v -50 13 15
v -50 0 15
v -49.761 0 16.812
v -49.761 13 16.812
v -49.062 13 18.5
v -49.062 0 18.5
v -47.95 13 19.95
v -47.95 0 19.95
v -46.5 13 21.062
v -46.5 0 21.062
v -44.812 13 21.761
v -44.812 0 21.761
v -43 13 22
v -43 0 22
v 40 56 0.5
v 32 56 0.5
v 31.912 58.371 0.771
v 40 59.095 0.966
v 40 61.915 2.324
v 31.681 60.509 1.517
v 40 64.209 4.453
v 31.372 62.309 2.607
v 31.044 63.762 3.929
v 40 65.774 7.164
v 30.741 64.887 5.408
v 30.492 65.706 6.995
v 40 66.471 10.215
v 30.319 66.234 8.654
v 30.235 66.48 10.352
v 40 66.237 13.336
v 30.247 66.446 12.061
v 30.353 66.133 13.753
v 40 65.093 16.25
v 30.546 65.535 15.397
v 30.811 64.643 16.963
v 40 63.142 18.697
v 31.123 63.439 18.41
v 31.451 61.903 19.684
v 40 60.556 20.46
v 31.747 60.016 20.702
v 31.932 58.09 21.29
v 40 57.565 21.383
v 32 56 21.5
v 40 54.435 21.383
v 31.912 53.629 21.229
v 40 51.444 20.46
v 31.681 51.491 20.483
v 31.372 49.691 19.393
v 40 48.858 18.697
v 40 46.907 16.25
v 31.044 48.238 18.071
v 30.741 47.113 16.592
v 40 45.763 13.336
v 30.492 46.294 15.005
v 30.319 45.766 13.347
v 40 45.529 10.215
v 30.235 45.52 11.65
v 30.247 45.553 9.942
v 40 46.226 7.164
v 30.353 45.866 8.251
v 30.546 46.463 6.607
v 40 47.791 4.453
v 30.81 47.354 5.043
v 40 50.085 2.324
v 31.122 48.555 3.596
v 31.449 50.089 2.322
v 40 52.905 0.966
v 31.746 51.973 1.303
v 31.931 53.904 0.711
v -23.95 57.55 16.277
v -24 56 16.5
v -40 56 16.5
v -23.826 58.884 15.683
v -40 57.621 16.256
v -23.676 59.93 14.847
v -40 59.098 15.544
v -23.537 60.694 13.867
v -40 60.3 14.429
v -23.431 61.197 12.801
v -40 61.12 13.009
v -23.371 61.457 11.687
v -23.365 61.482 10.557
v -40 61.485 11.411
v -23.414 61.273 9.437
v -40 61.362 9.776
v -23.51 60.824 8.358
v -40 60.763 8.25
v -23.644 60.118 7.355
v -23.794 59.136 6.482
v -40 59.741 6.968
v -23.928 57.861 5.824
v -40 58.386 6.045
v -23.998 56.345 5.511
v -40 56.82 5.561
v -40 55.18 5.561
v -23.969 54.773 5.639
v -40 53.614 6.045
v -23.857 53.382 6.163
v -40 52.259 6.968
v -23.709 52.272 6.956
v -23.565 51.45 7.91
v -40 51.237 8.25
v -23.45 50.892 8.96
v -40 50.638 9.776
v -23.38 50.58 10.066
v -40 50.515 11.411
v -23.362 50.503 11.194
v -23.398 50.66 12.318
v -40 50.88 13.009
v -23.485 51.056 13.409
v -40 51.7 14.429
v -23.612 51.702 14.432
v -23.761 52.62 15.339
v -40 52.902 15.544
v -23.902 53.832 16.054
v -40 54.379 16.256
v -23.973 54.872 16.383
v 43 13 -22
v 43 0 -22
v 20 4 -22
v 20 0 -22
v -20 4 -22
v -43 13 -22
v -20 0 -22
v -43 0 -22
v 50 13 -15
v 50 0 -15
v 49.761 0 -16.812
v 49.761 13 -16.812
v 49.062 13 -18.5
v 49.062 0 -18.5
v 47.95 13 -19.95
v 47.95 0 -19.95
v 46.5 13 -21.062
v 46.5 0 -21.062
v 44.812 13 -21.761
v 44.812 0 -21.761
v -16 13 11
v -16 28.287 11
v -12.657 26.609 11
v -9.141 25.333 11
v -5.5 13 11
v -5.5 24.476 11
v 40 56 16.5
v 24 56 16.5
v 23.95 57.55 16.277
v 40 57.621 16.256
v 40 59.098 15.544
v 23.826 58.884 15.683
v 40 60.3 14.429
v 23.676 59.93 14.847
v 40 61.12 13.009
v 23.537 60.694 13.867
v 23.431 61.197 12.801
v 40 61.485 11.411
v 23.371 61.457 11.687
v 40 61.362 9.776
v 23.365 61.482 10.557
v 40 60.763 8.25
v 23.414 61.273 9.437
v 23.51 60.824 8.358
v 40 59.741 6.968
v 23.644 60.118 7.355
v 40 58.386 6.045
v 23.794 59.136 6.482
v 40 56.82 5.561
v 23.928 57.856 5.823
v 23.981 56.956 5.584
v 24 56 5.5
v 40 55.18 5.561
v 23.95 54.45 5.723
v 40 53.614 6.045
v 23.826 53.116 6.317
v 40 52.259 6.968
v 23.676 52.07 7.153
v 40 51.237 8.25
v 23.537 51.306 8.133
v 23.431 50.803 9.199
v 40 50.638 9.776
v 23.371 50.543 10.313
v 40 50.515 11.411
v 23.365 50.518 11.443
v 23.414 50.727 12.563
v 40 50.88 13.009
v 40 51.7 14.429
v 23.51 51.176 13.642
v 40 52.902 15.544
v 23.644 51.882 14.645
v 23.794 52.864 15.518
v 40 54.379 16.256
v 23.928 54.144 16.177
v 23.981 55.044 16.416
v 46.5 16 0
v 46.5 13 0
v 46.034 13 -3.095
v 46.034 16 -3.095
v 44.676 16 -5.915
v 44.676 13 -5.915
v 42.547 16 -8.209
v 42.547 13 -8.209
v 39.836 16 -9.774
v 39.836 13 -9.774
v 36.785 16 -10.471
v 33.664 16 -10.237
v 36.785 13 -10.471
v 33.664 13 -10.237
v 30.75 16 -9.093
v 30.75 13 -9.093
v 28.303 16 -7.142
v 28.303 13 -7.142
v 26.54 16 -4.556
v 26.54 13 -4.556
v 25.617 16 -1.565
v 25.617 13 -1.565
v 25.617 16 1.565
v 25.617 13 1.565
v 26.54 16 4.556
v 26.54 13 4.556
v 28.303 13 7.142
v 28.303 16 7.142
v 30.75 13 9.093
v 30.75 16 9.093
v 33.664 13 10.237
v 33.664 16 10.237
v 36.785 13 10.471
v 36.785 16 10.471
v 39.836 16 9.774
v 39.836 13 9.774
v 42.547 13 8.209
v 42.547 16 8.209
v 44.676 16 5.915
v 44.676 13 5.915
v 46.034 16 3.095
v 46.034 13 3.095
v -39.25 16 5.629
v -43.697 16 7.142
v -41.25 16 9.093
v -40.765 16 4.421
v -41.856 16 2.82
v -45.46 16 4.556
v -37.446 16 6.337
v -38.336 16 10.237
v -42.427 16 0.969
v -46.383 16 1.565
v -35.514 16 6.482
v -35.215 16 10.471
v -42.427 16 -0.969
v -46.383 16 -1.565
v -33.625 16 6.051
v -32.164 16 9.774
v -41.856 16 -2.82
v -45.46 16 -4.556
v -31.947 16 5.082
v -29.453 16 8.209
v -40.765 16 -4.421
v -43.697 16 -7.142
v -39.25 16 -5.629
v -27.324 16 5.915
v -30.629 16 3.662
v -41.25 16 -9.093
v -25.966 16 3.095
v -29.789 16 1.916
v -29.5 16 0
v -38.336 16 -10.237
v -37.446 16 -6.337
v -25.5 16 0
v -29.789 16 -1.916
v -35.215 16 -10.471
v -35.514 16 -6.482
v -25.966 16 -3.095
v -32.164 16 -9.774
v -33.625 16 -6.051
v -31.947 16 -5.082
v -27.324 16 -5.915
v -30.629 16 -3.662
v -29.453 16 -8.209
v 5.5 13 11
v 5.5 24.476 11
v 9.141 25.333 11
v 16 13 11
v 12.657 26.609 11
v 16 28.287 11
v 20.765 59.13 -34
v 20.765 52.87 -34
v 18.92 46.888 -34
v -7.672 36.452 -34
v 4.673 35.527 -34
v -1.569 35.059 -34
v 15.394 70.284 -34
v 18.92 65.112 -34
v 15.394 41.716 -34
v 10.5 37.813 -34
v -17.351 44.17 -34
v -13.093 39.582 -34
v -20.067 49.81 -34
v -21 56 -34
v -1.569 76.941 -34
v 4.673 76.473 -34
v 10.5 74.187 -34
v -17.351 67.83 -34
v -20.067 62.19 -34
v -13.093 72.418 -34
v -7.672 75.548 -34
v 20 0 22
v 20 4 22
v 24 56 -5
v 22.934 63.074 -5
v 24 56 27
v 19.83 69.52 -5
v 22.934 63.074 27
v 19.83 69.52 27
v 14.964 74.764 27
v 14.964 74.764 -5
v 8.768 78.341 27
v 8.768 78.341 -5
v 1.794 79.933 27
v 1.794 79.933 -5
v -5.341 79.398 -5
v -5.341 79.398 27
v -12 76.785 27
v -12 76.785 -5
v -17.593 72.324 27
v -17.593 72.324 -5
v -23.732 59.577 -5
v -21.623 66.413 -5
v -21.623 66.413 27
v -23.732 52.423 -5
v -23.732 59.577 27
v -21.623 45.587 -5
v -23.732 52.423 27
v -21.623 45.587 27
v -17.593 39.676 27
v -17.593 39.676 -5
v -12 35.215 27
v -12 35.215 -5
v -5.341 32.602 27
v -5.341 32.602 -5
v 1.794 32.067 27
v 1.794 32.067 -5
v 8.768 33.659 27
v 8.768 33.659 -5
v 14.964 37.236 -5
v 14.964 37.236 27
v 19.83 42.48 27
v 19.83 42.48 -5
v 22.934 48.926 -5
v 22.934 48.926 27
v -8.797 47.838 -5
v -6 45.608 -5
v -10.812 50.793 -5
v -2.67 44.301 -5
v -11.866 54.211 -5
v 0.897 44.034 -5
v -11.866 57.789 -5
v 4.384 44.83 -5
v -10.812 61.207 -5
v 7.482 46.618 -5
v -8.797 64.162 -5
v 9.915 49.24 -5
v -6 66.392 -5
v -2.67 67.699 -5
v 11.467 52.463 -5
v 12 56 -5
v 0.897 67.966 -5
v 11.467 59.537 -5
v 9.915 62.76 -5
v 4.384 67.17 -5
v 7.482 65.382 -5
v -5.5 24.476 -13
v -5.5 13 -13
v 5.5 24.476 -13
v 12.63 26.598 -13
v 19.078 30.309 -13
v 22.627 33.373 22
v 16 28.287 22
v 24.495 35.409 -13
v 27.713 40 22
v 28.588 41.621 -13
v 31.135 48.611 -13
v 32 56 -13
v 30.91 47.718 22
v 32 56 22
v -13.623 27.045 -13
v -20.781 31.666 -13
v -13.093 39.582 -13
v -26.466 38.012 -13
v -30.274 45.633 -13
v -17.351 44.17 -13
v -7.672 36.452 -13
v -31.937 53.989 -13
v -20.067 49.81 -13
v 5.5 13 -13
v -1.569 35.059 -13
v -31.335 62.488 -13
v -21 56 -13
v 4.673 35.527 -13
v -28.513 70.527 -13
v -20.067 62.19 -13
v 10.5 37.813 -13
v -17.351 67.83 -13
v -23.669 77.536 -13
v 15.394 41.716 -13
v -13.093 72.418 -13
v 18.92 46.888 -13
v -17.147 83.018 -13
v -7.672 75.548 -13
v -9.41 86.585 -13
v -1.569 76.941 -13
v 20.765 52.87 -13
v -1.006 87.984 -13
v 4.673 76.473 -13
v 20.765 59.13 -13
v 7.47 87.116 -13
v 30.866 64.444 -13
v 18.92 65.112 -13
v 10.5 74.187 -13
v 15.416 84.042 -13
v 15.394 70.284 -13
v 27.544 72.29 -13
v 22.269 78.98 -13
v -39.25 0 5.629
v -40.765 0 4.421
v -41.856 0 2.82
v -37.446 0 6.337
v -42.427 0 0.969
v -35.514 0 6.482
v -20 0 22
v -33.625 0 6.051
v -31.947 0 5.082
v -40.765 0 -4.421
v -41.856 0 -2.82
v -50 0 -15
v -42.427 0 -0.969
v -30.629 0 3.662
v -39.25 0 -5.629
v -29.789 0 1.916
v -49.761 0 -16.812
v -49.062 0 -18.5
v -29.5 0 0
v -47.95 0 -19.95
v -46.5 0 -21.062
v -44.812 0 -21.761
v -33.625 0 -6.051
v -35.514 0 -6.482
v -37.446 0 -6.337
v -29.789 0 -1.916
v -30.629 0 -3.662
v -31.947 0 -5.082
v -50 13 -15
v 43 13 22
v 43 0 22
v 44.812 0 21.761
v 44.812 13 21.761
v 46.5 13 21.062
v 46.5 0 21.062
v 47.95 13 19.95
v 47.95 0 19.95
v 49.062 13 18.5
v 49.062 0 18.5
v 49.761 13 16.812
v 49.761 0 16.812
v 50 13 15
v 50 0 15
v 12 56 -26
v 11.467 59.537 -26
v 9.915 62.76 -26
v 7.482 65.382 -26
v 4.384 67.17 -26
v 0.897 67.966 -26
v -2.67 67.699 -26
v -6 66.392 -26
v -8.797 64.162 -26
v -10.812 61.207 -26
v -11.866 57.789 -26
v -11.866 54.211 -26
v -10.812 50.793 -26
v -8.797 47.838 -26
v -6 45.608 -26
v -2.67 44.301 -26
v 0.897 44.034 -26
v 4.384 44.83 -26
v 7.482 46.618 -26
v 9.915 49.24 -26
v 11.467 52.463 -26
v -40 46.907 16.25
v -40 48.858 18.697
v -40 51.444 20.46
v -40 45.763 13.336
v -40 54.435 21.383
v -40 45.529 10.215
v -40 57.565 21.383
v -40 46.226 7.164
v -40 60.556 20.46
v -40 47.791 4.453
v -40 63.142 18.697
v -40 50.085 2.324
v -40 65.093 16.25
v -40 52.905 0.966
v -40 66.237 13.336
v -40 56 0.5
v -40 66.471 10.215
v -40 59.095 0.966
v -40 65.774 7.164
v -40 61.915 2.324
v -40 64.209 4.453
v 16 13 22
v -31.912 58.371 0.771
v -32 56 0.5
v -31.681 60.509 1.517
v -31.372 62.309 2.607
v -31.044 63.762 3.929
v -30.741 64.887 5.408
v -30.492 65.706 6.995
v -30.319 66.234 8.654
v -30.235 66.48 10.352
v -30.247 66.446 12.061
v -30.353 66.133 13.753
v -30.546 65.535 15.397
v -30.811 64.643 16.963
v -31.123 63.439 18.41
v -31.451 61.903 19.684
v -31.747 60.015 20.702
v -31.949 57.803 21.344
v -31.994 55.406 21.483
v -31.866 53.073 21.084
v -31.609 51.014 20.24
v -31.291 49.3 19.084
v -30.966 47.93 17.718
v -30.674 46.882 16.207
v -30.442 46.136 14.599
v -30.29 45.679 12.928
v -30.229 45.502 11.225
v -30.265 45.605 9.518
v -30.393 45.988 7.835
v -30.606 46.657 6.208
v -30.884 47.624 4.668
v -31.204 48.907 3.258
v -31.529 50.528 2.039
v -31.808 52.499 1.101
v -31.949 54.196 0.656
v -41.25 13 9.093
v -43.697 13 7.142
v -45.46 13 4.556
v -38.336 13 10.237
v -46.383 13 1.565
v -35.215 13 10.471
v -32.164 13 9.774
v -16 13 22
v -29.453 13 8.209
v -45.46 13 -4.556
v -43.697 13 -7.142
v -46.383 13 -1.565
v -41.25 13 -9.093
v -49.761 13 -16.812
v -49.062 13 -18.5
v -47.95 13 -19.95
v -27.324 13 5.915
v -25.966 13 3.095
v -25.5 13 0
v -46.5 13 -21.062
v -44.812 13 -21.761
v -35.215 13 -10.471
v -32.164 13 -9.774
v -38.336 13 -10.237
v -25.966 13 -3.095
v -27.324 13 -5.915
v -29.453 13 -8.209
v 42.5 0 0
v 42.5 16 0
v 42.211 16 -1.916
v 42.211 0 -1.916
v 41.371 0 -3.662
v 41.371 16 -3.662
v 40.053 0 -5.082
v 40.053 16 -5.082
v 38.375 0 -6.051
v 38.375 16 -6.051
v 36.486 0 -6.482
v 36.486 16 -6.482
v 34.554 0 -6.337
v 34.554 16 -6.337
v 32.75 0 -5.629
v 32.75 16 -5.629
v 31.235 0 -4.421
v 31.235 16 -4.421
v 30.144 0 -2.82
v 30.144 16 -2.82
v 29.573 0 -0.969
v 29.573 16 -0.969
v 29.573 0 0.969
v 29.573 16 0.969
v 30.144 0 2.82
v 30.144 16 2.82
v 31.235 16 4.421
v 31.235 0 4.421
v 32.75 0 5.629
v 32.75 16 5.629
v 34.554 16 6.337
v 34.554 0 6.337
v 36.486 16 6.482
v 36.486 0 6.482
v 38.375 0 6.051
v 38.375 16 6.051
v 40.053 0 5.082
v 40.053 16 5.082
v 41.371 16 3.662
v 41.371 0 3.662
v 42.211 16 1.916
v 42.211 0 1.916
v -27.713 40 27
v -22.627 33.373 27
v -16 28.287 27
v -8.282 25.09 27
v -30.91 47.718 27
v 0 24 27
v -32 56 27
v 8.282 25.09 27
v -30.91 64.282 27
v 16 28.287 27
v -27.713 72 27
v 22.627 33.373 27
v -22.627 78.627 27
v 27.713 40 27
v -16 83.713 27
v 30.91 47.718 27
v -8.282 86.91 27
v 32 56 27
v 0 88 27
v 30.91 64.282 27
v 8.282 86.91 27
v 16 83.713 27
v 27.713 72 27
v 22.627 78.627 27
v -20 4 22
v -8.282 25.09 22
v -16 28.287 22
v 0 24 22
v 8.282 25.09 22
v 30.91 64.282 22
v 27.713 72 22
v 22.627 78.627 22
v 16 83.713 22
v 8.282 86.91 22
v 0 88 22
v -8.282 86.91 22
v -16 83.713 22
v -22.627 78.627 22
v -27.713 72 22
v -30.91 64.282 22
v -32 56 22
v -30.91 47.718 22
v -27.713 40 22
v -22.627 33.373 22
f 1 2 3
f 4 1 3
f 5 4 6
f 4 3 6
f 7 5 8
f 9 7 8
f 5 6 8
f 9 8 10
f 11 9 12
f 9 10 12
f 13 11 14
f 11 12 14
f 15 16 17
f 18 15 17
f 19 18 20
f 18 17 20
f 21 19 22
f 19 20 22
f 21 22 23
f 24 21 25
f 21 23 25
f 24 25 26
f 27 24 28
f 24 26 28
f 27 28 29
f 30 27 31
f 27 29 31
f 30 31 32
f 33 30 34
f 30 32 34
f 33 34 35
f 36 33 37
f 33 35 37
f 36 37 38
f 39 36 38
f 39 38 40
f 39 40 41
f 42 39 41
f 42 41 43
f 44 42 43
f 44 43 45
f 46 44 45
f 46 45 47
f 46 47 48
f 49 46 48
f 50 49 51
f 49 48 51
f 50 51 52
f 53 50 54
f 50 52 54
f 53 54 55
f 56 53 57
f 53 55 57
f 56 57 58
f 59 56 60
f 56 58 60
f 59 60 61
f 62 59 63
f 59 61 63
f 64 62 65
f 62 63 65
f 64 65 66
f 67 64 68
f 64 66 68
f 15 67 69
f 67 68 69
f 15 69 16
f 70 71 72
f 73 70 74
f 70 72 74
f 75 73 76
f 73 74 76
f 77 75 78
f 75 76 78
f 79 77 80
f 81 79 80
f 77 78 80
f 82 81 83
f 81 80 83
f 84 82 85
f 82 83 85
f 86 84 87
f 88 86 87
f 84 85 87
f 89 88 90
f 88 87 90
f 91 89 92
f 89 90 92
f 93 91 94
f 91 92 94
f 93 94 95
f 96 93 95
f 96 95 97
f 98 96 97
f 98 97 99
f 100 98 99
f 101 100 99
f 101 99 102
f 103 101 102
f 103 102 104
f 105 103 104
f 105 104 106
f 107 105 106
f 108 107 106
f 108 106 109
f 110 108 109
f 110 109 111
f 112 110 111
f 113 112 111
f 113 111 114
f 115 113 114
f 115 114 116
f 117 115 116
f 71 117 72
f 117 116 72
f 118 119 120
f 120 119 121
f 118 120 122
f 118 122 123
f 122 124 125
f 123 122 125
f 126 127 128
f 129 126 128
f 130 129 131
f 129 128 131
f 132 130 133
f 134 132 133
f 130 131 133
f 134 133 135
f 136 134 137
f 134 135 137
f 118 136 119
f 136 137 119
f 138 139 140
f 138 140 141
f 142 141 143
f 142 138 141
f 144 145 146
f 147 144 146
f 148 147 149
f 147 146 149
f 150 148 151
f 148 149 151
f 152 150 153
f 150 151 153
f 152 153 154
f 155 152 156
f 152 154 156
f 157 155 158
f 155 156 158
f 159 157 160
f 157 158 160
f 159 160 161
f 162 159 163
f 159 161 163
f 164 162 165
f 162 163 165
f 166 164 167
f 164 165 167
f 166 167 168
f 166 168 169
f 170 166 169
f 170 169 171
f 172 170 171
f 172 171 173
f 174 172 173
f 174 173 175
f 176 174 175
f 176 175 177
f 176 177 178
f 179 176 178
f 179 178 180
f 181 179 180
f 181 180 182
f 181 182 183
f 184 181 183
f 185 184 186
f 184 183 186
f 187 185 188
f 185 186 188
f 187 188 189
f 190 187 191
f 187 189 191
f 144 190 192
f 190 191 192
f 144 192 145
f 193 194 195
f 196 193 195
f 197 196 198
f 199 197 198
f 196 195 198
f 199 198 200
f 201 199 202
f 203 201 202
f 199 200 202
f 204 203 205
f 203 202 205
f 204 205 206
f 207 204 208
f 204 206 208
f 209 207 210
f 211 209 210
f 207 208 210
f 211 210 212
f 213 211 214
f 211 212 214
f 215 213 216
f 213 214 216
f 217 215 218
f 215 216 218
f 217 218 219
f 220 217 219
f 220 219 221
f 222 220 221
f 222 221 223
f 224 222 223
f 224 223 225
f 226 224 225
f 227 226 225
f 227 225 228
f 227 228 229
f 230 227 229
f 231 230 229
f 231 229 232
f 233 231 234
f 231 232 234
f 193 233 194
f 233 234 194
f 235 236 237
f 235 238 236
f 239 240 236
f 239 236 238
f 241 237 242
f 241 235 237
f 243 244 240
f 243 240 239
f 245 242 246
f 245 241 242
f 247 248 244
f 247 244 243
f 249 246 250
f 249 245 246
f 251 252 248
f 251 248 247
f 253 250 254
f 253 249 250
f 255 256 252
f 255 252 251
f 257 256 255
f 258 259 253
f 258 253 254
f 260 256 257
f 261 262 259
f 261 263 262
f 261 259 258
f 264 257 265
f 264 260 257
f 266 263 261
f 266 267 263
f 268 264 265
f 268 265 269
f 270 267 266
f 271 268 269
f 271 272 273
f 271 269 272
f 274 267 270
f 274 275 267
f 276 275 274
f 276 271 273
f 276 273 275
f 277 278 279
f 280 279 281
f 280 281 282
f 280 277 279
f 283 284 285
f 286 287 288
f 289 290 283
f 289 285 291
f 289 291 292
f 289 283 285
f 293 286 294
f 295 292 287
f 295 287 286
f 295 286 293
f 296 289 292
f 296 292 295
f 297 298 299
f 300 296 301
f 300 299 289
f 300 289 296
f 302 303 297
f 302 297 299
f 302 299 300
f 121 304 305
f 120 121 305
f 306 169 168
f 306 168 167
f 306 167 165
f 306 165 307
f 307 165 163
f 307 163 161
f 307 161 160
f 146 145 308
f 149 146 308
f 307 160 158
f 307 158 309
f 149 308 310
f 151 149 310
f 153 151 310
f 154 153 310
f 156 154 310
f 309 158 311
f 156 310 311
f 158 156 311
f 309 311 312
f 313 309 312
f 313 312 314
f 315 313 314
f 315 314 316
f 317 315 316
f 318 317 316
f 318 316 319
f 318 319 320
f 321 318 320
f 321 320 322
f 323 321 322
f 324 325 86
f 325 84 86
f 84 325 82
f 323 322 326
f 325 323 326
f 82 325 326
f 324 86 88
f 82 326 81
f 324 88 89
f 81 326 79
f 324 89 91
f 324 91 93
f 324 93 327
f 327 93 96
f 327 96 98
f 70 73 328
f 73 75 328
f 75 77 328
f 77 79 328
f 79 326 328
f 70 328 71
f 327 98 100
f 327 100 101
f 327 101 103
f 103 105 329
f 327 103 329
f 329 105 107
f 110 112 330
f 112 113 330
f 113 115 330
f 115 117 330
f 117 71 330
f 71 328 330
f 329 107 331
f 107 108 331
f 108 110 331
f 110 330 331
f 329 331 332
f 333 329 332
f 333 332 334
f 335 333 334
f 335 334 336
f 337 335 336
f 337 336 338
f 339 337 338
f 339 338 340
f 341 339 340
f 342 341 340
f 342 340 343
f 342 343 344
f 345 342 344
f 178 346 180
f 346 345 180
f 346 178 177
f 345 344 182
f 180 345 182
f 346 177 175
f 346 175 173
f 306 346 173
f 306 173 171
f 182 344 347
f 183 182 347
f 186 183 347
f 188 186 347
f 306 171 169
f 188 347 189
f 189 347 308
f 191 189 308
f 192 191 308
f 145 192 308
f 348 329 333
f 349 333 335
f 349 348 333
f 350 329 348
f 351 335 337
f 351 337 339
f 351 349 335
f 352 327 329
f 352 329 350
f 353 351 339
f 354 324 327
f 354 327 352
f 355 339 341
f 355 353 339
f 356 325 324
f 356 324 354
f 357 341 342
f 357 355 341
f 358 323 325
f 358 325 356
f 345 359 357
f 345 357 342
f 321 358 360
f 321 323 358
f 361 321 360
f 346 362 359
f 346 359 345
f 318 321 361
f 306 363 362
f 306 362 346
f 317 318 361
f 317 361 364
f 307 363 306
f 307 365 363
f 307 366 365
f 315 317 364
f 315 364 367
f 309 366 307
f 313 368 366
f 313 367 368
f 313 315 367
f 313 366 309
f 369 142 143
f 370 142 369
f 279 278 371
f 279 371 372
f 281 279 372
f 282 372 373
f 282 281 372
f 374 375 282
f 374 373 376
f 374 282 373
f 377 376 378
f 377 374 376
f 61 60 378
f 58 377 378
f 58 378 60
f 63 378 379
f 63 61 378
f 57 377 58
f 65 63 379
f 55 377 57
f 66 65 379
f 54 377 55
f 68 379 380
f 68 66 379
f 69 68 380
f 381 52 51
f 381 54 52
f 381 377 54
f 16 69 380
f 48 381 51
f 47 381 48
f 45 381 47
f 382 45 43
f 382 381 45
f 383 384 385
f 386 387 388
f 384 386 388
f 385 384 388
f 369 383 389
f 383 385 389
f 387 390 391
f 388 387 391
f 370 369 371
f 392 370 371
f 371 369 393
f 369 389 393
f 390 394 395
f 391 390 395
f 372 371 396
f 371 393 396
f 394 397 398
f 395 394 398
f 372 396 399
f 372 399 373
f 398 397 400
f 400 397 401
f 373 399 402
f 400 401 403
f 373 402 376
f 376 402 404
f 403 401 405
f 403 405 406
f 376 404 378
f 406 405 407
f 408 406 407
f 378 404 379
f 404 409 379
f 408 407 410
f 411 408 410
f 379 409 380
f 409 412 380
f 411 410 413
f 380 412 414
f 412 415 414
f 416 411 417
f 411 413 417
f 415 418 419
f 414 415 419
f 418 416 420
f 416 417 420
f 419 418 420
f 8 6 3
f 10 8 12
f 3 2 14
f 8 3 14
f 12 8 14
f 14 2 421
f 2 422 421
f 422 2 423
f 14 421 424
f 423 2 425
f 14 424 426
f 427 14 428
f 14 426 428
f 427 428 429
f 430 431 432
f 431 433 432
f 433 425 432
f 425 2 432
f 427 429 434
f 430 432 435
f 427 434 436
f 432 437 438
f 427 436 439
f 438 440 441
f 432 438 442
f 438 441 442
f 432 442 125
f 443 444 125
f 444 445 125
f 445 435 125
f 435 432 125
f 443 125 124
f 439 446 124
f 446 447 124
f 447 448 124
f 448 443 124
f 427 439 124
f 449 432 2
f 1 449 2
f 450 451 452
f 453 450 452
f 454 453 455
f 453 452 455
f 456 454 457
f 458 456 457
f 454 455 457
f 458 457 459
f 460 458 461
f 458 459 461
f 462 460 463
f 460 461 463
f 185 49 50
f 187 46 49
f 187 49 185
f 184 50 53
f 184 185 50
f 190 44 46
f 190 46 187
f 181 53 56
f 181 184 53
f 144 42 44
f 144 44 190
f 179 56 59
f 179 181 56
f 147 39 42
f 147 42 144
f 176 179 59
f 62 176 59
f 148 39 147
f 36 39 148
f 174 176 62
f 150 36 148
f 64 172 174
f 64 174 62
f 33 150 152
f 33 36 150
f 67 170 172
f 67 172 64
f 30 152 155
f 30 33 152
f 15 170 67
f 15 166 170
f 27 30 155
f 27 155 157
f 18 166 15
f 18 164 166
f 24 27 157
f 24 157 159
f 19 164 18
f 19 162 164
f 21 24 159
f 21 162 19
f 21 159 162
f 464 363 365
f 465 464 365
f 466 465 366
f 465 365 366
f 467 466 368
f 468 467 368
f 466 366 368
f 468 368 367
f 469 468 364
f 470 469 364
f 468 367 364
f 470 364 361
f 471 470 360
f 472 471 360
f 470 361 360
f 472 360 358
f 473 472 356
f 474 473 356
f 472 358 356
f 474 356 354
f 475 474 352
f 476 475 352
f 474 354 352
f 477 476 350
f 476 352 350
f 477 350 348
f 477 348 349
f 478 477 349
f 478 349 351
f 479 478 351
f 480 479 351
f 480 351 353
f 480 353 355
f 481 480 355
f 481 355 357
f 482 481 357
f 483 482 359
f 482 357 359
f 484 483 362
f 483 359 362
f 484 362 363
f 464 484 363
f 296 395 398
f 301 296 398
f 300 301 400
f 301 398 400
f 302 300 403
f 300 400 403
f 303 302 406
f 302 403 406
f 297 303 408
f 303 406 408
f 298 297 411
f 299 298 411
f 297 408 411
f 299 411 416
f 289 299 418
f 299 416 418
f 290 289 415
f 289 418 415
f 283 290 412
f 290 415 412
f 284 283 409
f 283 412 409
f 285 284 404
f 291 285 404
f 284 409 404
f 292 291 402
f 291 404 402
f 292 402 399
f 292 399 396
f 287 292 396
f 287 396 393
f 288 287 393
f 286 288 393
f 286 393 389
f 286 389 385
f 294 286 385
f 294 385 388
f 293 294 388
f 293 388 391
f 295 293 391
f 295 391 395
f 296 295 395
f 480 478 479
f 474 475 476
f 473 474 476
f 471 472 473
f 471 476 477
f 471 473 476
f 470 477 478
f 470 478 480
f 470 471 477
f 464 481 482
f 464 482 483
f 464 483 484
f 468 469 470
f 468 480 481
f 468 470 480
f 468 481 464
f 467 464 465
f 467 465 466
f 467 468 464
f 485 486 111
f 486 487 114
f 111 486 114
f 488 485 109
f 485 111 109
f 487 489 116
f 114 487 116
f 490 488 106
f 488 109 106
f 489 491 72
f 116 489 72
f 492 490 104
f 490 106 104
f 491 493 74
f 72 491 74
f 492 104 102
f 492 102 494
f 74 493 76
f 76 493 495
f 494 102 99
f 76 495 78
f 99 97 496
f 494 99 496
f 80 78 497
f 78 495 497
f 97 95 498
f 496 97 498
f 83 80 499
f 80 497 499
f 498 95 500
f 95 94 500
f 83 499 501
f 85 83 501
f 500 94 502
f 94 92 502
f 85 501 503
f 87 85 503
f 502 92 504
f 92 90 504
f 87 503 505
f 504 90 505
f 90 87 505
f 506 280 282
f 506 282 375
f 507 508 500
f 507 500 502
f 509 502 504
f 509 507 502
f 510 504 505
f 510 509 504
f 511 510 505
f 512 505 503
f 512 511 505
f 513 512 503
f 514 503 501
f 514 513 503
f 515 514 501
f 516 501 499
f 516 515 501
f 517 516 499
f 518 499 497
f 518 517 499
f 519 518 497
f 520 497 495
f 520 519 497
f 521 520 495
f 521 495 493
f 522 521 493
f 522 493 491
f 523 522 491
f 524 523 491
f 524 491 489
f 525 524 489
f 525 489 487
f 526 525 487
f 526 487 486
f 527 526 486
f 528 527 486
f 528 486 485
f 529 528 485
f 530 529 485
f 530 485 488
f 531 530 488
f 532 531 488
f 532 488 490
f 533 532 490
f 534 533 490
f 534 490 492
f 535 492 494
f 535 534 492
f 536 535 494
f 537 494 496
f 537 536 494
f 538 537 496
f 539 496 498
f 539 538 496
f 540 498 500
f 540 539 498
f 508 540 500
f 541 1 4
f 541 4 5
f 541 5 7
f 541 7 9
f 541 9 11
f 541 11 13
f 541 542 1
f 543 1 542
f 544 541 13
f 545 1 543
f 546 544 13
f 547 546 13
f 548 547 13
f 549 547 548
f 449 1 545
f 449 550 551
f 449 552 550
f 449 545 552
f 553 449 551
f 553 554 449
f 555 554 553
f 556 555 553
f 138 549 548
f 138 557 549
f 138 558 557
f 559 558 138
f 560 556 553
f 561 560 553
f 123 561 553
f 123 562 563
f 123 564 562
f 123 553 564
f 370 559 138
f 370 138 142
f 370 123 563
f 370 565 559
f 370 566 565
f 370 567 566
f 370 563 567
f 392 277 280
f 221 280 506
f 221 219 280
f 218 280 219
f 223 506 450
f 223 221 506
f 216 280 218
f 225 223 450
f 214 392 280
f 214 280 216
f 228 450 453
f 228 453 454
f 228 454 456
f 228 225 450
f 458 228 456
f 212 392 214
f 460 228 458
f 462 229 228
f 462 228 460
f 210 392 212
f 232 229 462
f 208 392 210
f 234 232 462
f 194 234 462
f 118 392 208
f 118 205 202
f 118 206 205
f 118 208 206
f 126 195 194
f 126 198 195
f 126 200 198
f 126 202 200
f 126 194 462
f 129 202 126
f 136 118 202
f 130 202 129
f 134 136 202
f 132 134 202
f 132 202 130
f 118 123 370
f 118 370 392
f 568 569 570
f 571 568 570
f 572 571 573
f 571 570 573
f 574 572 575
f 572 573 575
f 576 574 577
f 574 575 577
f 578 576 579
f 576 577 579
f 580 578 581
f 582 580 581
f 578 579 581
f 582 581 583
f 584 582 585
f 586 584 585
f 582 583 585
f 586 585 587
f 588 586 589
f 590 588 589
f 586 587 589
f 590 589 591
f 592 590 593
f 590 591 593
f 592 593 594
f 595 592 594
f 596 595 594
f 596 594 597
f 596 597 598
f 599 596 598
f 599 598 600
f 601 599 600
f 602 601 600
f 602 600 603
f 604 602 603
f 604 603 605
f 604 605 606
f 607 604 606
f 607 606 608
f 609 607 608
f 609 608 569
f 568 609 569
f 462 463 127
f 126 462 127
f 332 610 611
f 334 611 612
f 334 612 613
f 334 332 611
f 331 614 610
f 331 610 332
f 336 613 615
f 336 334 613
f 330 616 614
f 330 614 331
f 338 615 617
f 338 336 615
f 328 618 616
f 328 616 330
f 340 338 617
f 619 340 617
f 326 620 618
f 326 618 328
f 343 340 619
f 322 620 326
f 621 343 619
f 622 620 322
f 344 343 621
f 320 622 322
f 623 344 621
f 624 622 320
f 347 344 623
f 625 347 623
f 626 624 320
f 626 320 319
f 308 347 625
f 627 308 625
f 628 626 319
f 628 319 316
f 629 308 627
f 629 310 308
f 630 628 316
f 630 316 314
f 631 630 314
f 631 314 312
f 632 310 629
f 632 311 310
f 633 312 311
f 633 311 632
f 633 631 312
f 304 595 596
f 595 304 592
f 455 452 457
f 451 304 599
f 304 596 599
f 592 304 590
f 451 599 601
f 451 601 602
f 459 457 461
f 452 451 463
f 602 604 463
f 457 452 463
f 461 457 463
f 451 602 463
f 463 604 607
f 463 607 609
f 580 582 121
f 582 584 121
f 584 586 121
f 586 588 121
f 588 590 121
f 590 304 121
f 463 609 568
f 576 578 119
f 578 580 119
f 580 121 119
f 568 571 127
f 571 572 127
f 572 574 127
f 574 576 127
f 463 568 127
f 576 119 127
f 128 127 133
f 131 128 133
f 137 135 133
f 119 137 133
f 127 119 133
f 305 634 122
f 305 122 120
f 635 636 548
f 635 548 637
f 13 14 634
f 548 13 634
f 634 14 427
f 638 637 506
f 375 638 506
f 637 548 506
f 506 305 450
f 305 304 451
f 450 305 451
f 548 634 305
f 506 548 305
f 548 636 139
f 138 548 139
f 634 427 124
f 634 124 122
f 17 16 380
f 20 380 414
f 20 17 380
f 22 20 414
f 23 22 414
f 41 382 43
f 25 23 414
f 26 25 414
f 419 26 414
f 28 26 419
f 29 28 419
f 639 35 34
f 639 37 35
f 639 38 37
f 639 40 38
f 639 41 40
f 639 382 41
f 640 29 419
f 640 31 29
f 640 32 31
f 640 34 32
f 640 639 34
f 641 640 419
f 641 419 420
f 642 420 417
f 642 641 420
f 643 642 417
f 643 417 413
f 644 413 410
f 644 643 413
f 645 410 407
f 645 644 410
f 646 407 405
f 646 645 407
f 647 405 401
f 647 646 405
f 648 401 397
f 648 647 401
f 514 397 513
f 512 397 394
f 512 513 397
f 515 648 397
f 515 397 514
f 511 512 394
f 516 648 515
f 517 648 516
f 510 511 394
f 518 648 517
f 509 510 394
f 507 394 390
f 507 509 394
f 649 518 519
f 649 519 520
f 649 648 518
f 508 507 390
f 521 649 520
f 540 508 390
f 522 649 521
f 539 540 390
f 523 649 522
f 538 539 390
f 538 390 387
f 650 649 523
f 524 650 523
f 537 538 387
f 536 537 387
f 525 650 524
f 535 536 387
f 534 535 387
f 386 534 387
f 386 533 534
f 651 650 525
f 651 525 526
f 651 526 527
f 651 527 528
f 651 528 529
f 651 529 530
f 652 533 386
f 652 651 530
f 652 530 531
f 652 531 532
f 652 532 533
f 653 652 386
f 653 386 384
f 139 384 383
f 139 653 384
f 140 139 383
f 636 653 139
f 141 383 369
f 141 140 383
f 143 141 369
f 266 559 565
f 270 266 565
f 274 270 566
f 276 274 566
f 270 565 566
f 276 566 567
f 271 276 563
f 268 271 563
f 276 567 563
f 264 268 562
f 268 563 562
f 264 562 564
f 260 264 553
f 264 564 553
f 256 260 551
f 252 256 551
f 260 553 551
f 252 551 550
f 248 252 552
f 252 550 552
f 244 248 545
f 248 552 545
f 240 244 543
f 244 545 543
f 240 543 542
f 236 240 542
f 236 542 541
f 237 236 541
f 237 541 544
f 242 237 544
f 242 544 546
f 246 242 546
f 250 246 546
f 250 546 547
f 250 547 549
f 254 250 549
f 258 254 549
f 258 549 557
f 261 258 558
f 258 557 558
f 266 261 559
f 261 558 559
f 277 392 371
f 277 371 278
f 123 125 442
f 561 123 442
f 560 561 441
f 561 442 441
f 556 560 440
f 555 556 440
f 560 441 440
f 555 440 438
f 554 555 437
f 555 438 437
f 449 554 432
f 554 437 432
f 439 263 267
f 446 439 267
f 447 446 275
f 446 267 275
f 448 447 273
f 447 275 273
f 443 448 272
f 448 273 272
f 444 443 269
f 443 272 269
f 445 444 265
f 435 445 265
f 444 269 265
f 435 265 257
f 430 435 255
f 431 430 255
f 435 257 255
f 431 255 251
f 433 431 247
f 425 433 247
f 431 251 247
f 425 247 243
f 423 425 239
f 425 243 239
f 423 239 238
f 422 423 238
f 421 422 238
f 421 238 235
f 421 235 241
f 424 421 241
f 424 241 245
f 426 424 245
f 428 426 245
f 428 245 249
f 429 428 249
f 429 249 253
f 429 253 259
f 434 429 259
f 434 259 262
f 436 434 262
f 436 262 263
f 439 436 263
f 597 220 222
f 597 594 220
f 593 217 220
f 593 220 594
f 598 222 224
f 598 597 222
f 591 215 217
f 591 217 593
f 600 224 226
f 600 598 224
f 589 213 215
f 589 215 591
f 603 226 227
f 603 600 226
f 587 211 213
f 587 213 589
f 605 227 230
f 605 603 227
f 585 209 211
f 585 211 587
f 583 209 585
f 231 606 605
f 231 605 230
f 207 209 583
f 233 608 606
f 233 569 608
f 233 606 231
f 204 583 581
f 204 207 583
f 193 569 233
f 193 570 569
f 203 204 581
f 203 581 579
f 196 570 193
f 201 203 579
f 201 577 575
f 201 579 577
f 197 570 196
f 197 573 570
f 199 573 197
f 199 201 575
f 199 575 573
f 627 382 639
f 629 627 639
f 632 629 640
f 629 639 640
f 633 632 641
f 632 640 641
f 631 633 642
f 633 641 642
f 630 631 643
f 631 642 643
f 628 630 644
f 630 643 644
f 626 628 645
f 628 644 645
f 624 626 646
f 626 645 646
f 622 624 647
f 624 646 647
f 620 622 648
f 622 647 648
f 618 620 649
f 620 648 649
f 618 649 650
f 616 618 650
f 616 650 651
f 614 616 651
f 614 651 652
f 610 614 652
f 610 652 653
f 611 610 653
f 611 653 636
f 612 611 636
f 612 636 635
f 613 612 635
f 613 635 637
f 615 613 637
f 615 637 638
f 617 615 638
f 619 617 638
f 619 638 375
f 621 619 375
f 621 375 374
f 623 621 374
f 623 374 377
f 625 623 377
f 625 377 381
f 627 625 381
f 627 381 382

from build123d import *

# Parameters (mm, degrees)
EXTRUDE_1_DEPTH      = 13
SKETCH_2_R           = 10.5
EXTRUDE_2_DEPTH      = 3
EXTRUDE_3_DEPTH      = 56
SKETCH_4_R           = 32
EXTRUDE_4_DEPTH      = 5
EXTRUDE_4_DEPTH_BACK = 35
SKETCH_5_R           = 21
EXTRUDE_5_DEPTH      = 21
SKETCH_6_R           = 10.5
EXTRUDE_6_DEPTH      = 40
SKETCH_7_R           = 5.5
CUT_EXTRUDE_1_DEPTH  = 91
SKETCH_8_R           = 24
CUT_EXTRUDE_2_DEPTH  = 32
SKETCH_9_R           = 12
CUT_EXTRUDE_3_DEPTH  = 21
SKETCH_10_R          = 6.5
CUT_EXTRUDE_4_DEPTH  = 17
SKETCH_11_W          = 40
SKETCH_11_H          = 8
CUT_EXTRUDE_5_DEPTH  = 57


with BuildPart() as part:
    # 草图1 → 凸台-拉伸1 (new body)
    with BuildSketch(Plane(origin=(0, 0, 0), x_dir=(1, 0, 0), z_dir=(0, 1, 0))):
        with BuildLine():
            Line((-43, -22), (43, -22))
            ThreePointArc((43, -22), (47.949747468, -19.949747468), (50, -15))
            Line((50, -15), (50, 15))
            ThreePointArc((50, 15), (47.949747468, 19.949747468), (43, 22))
            Line((43, 22), (-43, 22))
            ThreePointArc((-43, 22), (-47.949747468, 19.949747468), (-50, 15))
            Line((-50, 15), (-50, -15))
            ThreePointArc((-50, -15), (-47.949747468, -19.949747468), (-43, -22))
        make_face()
    extrude(amount=EXTRUDE_1_DEPTH)

    # 草图2 → 凸台-拉伸2 (add)
    with BuildSketch(Plane(origin=(0, 13, 0), x_dir=(1, 0, 0), z_dir=(0, 1, 0))):
        with Locations((-36, 0)):
            Circle(SKETCH_2_R)
        with Locations((36, 0)):
            Circle(SKETCH_2_R)
    extrude(amount=EXTRUDE_2_DEPTH)

    # 草图3 → 凸台-拉伸3 (add)
    with BuildSketch(Plane(origin=(0, 13, 0), x_dir=(1, 0, 0), z_dir=(0, 1, 0))):
        Polygon((16, -22), (-16, -22), (-16, -11), (-5.5, -11), (-5.5, 13), (5.5, 13), (5.5, -11), (16, -11), align=None)
    extrude(amount=EXTRUDE_3_DEPTH)

    # 草图4 → 凸台-拉伸4 (add, two sides)
    with BuildSketch(Plane.XY.offset(22)) as extrude_4_sk:
        with Locations((0, 56)):
            Circle(SKETCH_4_R)
    extrude(amount=EXTRUDE_4_DEPTH)
    extrude(extrude_4_sk.sketch, amount=-EXTRUDE_4_DEPTH_BACK)

    # 草图5 → 凸台-拉伸5 (add)
    with BuildSketch(Plane(origin=(0, 0, -13), x_dir=(-1, 0, 0), z_dir=(0, 0, -1))):
        with Locations((0, 56)):
            Circle(SKETCH_5_R)
    extrude(amount=EXTRUDE_5_DEPTH)

    # 草图6 → 凸台-拉伸6 (add)
    with BuildSketch(Plane(origin=(0, 0, 0), x_dir=(0, 0, -1), z_dir=(1, 0, 0))):
        with Locations((-11, 56)):
            Circle(SKETCH_6_R)
    extrude_6 = extrude(amount=EXTRUDE_6_DEPTH)

    # 镜向1: 凸台-拉伸6 across plane
    add(extrude_6.mirror(Plane(origin=(0, 0, 0), x_dir=(0, 0, 1), z_dir=(1, 0, 0))))

    # 草图7 → 切除-拉伸1 (cut, through all)
    with BuildSketch(Plane.ZY.offset(40)):
        with Locations((11, 56)):
            Circle(SKETCH_7_R)
    extrude(amount=-CUT_EXTRUDE_1_DEPTH, mode=Mode.SUBTRACT)

    # 草图8 → 切除-拉伸2 (cut)
    with BuildSketch(Plane.XY.offset(27)):
        with Locations((0, 56)):
            Circle(SKETCH_8_R)
    extrude(amount=-CUT_EXTRUDE_2_DEPTH, mode=Mode.SUBTRACT)

    # 草图9 → 切除-拉伸3 (cut)
    with BuildSketch(Plane.XY.offset(-5)):
        with Locations((0, 56)):
            Circle(SKETCH_9_R)
    extrude(amount=-CUT_EXTRUDE_3_DEPTH, mode=Mode.SUBTRACT)

    # 草图10 → 切除-拉伸4 (cut, through all)
    with BuildSketch(Plane(origin=(0, 16, 0), x_dir=(1, 0, 0), z_dir=(0, 1, 0))):
        with Locations((-36, 0)):
            Circle(SKETCH_10_R)
        with Locations((36, 0)):
            Circle(SKETCH_10_R)
    extrude(amount=-CUT_EXTRUDE_4_DEPTH, mode=Mode.SUBTRACT)

    # 草图11 → 切除-拉伸5 (cut, through all)
    with BuildSketch(Plane.XY.offset(22)):
        Rectangle(SKETCH_11_W, SKETCH_11_H)
    extrude(amount=-CUT_EXTRUDE_5_DEPTH, mode=Mode.SUBTRACT)


solid = part.part
